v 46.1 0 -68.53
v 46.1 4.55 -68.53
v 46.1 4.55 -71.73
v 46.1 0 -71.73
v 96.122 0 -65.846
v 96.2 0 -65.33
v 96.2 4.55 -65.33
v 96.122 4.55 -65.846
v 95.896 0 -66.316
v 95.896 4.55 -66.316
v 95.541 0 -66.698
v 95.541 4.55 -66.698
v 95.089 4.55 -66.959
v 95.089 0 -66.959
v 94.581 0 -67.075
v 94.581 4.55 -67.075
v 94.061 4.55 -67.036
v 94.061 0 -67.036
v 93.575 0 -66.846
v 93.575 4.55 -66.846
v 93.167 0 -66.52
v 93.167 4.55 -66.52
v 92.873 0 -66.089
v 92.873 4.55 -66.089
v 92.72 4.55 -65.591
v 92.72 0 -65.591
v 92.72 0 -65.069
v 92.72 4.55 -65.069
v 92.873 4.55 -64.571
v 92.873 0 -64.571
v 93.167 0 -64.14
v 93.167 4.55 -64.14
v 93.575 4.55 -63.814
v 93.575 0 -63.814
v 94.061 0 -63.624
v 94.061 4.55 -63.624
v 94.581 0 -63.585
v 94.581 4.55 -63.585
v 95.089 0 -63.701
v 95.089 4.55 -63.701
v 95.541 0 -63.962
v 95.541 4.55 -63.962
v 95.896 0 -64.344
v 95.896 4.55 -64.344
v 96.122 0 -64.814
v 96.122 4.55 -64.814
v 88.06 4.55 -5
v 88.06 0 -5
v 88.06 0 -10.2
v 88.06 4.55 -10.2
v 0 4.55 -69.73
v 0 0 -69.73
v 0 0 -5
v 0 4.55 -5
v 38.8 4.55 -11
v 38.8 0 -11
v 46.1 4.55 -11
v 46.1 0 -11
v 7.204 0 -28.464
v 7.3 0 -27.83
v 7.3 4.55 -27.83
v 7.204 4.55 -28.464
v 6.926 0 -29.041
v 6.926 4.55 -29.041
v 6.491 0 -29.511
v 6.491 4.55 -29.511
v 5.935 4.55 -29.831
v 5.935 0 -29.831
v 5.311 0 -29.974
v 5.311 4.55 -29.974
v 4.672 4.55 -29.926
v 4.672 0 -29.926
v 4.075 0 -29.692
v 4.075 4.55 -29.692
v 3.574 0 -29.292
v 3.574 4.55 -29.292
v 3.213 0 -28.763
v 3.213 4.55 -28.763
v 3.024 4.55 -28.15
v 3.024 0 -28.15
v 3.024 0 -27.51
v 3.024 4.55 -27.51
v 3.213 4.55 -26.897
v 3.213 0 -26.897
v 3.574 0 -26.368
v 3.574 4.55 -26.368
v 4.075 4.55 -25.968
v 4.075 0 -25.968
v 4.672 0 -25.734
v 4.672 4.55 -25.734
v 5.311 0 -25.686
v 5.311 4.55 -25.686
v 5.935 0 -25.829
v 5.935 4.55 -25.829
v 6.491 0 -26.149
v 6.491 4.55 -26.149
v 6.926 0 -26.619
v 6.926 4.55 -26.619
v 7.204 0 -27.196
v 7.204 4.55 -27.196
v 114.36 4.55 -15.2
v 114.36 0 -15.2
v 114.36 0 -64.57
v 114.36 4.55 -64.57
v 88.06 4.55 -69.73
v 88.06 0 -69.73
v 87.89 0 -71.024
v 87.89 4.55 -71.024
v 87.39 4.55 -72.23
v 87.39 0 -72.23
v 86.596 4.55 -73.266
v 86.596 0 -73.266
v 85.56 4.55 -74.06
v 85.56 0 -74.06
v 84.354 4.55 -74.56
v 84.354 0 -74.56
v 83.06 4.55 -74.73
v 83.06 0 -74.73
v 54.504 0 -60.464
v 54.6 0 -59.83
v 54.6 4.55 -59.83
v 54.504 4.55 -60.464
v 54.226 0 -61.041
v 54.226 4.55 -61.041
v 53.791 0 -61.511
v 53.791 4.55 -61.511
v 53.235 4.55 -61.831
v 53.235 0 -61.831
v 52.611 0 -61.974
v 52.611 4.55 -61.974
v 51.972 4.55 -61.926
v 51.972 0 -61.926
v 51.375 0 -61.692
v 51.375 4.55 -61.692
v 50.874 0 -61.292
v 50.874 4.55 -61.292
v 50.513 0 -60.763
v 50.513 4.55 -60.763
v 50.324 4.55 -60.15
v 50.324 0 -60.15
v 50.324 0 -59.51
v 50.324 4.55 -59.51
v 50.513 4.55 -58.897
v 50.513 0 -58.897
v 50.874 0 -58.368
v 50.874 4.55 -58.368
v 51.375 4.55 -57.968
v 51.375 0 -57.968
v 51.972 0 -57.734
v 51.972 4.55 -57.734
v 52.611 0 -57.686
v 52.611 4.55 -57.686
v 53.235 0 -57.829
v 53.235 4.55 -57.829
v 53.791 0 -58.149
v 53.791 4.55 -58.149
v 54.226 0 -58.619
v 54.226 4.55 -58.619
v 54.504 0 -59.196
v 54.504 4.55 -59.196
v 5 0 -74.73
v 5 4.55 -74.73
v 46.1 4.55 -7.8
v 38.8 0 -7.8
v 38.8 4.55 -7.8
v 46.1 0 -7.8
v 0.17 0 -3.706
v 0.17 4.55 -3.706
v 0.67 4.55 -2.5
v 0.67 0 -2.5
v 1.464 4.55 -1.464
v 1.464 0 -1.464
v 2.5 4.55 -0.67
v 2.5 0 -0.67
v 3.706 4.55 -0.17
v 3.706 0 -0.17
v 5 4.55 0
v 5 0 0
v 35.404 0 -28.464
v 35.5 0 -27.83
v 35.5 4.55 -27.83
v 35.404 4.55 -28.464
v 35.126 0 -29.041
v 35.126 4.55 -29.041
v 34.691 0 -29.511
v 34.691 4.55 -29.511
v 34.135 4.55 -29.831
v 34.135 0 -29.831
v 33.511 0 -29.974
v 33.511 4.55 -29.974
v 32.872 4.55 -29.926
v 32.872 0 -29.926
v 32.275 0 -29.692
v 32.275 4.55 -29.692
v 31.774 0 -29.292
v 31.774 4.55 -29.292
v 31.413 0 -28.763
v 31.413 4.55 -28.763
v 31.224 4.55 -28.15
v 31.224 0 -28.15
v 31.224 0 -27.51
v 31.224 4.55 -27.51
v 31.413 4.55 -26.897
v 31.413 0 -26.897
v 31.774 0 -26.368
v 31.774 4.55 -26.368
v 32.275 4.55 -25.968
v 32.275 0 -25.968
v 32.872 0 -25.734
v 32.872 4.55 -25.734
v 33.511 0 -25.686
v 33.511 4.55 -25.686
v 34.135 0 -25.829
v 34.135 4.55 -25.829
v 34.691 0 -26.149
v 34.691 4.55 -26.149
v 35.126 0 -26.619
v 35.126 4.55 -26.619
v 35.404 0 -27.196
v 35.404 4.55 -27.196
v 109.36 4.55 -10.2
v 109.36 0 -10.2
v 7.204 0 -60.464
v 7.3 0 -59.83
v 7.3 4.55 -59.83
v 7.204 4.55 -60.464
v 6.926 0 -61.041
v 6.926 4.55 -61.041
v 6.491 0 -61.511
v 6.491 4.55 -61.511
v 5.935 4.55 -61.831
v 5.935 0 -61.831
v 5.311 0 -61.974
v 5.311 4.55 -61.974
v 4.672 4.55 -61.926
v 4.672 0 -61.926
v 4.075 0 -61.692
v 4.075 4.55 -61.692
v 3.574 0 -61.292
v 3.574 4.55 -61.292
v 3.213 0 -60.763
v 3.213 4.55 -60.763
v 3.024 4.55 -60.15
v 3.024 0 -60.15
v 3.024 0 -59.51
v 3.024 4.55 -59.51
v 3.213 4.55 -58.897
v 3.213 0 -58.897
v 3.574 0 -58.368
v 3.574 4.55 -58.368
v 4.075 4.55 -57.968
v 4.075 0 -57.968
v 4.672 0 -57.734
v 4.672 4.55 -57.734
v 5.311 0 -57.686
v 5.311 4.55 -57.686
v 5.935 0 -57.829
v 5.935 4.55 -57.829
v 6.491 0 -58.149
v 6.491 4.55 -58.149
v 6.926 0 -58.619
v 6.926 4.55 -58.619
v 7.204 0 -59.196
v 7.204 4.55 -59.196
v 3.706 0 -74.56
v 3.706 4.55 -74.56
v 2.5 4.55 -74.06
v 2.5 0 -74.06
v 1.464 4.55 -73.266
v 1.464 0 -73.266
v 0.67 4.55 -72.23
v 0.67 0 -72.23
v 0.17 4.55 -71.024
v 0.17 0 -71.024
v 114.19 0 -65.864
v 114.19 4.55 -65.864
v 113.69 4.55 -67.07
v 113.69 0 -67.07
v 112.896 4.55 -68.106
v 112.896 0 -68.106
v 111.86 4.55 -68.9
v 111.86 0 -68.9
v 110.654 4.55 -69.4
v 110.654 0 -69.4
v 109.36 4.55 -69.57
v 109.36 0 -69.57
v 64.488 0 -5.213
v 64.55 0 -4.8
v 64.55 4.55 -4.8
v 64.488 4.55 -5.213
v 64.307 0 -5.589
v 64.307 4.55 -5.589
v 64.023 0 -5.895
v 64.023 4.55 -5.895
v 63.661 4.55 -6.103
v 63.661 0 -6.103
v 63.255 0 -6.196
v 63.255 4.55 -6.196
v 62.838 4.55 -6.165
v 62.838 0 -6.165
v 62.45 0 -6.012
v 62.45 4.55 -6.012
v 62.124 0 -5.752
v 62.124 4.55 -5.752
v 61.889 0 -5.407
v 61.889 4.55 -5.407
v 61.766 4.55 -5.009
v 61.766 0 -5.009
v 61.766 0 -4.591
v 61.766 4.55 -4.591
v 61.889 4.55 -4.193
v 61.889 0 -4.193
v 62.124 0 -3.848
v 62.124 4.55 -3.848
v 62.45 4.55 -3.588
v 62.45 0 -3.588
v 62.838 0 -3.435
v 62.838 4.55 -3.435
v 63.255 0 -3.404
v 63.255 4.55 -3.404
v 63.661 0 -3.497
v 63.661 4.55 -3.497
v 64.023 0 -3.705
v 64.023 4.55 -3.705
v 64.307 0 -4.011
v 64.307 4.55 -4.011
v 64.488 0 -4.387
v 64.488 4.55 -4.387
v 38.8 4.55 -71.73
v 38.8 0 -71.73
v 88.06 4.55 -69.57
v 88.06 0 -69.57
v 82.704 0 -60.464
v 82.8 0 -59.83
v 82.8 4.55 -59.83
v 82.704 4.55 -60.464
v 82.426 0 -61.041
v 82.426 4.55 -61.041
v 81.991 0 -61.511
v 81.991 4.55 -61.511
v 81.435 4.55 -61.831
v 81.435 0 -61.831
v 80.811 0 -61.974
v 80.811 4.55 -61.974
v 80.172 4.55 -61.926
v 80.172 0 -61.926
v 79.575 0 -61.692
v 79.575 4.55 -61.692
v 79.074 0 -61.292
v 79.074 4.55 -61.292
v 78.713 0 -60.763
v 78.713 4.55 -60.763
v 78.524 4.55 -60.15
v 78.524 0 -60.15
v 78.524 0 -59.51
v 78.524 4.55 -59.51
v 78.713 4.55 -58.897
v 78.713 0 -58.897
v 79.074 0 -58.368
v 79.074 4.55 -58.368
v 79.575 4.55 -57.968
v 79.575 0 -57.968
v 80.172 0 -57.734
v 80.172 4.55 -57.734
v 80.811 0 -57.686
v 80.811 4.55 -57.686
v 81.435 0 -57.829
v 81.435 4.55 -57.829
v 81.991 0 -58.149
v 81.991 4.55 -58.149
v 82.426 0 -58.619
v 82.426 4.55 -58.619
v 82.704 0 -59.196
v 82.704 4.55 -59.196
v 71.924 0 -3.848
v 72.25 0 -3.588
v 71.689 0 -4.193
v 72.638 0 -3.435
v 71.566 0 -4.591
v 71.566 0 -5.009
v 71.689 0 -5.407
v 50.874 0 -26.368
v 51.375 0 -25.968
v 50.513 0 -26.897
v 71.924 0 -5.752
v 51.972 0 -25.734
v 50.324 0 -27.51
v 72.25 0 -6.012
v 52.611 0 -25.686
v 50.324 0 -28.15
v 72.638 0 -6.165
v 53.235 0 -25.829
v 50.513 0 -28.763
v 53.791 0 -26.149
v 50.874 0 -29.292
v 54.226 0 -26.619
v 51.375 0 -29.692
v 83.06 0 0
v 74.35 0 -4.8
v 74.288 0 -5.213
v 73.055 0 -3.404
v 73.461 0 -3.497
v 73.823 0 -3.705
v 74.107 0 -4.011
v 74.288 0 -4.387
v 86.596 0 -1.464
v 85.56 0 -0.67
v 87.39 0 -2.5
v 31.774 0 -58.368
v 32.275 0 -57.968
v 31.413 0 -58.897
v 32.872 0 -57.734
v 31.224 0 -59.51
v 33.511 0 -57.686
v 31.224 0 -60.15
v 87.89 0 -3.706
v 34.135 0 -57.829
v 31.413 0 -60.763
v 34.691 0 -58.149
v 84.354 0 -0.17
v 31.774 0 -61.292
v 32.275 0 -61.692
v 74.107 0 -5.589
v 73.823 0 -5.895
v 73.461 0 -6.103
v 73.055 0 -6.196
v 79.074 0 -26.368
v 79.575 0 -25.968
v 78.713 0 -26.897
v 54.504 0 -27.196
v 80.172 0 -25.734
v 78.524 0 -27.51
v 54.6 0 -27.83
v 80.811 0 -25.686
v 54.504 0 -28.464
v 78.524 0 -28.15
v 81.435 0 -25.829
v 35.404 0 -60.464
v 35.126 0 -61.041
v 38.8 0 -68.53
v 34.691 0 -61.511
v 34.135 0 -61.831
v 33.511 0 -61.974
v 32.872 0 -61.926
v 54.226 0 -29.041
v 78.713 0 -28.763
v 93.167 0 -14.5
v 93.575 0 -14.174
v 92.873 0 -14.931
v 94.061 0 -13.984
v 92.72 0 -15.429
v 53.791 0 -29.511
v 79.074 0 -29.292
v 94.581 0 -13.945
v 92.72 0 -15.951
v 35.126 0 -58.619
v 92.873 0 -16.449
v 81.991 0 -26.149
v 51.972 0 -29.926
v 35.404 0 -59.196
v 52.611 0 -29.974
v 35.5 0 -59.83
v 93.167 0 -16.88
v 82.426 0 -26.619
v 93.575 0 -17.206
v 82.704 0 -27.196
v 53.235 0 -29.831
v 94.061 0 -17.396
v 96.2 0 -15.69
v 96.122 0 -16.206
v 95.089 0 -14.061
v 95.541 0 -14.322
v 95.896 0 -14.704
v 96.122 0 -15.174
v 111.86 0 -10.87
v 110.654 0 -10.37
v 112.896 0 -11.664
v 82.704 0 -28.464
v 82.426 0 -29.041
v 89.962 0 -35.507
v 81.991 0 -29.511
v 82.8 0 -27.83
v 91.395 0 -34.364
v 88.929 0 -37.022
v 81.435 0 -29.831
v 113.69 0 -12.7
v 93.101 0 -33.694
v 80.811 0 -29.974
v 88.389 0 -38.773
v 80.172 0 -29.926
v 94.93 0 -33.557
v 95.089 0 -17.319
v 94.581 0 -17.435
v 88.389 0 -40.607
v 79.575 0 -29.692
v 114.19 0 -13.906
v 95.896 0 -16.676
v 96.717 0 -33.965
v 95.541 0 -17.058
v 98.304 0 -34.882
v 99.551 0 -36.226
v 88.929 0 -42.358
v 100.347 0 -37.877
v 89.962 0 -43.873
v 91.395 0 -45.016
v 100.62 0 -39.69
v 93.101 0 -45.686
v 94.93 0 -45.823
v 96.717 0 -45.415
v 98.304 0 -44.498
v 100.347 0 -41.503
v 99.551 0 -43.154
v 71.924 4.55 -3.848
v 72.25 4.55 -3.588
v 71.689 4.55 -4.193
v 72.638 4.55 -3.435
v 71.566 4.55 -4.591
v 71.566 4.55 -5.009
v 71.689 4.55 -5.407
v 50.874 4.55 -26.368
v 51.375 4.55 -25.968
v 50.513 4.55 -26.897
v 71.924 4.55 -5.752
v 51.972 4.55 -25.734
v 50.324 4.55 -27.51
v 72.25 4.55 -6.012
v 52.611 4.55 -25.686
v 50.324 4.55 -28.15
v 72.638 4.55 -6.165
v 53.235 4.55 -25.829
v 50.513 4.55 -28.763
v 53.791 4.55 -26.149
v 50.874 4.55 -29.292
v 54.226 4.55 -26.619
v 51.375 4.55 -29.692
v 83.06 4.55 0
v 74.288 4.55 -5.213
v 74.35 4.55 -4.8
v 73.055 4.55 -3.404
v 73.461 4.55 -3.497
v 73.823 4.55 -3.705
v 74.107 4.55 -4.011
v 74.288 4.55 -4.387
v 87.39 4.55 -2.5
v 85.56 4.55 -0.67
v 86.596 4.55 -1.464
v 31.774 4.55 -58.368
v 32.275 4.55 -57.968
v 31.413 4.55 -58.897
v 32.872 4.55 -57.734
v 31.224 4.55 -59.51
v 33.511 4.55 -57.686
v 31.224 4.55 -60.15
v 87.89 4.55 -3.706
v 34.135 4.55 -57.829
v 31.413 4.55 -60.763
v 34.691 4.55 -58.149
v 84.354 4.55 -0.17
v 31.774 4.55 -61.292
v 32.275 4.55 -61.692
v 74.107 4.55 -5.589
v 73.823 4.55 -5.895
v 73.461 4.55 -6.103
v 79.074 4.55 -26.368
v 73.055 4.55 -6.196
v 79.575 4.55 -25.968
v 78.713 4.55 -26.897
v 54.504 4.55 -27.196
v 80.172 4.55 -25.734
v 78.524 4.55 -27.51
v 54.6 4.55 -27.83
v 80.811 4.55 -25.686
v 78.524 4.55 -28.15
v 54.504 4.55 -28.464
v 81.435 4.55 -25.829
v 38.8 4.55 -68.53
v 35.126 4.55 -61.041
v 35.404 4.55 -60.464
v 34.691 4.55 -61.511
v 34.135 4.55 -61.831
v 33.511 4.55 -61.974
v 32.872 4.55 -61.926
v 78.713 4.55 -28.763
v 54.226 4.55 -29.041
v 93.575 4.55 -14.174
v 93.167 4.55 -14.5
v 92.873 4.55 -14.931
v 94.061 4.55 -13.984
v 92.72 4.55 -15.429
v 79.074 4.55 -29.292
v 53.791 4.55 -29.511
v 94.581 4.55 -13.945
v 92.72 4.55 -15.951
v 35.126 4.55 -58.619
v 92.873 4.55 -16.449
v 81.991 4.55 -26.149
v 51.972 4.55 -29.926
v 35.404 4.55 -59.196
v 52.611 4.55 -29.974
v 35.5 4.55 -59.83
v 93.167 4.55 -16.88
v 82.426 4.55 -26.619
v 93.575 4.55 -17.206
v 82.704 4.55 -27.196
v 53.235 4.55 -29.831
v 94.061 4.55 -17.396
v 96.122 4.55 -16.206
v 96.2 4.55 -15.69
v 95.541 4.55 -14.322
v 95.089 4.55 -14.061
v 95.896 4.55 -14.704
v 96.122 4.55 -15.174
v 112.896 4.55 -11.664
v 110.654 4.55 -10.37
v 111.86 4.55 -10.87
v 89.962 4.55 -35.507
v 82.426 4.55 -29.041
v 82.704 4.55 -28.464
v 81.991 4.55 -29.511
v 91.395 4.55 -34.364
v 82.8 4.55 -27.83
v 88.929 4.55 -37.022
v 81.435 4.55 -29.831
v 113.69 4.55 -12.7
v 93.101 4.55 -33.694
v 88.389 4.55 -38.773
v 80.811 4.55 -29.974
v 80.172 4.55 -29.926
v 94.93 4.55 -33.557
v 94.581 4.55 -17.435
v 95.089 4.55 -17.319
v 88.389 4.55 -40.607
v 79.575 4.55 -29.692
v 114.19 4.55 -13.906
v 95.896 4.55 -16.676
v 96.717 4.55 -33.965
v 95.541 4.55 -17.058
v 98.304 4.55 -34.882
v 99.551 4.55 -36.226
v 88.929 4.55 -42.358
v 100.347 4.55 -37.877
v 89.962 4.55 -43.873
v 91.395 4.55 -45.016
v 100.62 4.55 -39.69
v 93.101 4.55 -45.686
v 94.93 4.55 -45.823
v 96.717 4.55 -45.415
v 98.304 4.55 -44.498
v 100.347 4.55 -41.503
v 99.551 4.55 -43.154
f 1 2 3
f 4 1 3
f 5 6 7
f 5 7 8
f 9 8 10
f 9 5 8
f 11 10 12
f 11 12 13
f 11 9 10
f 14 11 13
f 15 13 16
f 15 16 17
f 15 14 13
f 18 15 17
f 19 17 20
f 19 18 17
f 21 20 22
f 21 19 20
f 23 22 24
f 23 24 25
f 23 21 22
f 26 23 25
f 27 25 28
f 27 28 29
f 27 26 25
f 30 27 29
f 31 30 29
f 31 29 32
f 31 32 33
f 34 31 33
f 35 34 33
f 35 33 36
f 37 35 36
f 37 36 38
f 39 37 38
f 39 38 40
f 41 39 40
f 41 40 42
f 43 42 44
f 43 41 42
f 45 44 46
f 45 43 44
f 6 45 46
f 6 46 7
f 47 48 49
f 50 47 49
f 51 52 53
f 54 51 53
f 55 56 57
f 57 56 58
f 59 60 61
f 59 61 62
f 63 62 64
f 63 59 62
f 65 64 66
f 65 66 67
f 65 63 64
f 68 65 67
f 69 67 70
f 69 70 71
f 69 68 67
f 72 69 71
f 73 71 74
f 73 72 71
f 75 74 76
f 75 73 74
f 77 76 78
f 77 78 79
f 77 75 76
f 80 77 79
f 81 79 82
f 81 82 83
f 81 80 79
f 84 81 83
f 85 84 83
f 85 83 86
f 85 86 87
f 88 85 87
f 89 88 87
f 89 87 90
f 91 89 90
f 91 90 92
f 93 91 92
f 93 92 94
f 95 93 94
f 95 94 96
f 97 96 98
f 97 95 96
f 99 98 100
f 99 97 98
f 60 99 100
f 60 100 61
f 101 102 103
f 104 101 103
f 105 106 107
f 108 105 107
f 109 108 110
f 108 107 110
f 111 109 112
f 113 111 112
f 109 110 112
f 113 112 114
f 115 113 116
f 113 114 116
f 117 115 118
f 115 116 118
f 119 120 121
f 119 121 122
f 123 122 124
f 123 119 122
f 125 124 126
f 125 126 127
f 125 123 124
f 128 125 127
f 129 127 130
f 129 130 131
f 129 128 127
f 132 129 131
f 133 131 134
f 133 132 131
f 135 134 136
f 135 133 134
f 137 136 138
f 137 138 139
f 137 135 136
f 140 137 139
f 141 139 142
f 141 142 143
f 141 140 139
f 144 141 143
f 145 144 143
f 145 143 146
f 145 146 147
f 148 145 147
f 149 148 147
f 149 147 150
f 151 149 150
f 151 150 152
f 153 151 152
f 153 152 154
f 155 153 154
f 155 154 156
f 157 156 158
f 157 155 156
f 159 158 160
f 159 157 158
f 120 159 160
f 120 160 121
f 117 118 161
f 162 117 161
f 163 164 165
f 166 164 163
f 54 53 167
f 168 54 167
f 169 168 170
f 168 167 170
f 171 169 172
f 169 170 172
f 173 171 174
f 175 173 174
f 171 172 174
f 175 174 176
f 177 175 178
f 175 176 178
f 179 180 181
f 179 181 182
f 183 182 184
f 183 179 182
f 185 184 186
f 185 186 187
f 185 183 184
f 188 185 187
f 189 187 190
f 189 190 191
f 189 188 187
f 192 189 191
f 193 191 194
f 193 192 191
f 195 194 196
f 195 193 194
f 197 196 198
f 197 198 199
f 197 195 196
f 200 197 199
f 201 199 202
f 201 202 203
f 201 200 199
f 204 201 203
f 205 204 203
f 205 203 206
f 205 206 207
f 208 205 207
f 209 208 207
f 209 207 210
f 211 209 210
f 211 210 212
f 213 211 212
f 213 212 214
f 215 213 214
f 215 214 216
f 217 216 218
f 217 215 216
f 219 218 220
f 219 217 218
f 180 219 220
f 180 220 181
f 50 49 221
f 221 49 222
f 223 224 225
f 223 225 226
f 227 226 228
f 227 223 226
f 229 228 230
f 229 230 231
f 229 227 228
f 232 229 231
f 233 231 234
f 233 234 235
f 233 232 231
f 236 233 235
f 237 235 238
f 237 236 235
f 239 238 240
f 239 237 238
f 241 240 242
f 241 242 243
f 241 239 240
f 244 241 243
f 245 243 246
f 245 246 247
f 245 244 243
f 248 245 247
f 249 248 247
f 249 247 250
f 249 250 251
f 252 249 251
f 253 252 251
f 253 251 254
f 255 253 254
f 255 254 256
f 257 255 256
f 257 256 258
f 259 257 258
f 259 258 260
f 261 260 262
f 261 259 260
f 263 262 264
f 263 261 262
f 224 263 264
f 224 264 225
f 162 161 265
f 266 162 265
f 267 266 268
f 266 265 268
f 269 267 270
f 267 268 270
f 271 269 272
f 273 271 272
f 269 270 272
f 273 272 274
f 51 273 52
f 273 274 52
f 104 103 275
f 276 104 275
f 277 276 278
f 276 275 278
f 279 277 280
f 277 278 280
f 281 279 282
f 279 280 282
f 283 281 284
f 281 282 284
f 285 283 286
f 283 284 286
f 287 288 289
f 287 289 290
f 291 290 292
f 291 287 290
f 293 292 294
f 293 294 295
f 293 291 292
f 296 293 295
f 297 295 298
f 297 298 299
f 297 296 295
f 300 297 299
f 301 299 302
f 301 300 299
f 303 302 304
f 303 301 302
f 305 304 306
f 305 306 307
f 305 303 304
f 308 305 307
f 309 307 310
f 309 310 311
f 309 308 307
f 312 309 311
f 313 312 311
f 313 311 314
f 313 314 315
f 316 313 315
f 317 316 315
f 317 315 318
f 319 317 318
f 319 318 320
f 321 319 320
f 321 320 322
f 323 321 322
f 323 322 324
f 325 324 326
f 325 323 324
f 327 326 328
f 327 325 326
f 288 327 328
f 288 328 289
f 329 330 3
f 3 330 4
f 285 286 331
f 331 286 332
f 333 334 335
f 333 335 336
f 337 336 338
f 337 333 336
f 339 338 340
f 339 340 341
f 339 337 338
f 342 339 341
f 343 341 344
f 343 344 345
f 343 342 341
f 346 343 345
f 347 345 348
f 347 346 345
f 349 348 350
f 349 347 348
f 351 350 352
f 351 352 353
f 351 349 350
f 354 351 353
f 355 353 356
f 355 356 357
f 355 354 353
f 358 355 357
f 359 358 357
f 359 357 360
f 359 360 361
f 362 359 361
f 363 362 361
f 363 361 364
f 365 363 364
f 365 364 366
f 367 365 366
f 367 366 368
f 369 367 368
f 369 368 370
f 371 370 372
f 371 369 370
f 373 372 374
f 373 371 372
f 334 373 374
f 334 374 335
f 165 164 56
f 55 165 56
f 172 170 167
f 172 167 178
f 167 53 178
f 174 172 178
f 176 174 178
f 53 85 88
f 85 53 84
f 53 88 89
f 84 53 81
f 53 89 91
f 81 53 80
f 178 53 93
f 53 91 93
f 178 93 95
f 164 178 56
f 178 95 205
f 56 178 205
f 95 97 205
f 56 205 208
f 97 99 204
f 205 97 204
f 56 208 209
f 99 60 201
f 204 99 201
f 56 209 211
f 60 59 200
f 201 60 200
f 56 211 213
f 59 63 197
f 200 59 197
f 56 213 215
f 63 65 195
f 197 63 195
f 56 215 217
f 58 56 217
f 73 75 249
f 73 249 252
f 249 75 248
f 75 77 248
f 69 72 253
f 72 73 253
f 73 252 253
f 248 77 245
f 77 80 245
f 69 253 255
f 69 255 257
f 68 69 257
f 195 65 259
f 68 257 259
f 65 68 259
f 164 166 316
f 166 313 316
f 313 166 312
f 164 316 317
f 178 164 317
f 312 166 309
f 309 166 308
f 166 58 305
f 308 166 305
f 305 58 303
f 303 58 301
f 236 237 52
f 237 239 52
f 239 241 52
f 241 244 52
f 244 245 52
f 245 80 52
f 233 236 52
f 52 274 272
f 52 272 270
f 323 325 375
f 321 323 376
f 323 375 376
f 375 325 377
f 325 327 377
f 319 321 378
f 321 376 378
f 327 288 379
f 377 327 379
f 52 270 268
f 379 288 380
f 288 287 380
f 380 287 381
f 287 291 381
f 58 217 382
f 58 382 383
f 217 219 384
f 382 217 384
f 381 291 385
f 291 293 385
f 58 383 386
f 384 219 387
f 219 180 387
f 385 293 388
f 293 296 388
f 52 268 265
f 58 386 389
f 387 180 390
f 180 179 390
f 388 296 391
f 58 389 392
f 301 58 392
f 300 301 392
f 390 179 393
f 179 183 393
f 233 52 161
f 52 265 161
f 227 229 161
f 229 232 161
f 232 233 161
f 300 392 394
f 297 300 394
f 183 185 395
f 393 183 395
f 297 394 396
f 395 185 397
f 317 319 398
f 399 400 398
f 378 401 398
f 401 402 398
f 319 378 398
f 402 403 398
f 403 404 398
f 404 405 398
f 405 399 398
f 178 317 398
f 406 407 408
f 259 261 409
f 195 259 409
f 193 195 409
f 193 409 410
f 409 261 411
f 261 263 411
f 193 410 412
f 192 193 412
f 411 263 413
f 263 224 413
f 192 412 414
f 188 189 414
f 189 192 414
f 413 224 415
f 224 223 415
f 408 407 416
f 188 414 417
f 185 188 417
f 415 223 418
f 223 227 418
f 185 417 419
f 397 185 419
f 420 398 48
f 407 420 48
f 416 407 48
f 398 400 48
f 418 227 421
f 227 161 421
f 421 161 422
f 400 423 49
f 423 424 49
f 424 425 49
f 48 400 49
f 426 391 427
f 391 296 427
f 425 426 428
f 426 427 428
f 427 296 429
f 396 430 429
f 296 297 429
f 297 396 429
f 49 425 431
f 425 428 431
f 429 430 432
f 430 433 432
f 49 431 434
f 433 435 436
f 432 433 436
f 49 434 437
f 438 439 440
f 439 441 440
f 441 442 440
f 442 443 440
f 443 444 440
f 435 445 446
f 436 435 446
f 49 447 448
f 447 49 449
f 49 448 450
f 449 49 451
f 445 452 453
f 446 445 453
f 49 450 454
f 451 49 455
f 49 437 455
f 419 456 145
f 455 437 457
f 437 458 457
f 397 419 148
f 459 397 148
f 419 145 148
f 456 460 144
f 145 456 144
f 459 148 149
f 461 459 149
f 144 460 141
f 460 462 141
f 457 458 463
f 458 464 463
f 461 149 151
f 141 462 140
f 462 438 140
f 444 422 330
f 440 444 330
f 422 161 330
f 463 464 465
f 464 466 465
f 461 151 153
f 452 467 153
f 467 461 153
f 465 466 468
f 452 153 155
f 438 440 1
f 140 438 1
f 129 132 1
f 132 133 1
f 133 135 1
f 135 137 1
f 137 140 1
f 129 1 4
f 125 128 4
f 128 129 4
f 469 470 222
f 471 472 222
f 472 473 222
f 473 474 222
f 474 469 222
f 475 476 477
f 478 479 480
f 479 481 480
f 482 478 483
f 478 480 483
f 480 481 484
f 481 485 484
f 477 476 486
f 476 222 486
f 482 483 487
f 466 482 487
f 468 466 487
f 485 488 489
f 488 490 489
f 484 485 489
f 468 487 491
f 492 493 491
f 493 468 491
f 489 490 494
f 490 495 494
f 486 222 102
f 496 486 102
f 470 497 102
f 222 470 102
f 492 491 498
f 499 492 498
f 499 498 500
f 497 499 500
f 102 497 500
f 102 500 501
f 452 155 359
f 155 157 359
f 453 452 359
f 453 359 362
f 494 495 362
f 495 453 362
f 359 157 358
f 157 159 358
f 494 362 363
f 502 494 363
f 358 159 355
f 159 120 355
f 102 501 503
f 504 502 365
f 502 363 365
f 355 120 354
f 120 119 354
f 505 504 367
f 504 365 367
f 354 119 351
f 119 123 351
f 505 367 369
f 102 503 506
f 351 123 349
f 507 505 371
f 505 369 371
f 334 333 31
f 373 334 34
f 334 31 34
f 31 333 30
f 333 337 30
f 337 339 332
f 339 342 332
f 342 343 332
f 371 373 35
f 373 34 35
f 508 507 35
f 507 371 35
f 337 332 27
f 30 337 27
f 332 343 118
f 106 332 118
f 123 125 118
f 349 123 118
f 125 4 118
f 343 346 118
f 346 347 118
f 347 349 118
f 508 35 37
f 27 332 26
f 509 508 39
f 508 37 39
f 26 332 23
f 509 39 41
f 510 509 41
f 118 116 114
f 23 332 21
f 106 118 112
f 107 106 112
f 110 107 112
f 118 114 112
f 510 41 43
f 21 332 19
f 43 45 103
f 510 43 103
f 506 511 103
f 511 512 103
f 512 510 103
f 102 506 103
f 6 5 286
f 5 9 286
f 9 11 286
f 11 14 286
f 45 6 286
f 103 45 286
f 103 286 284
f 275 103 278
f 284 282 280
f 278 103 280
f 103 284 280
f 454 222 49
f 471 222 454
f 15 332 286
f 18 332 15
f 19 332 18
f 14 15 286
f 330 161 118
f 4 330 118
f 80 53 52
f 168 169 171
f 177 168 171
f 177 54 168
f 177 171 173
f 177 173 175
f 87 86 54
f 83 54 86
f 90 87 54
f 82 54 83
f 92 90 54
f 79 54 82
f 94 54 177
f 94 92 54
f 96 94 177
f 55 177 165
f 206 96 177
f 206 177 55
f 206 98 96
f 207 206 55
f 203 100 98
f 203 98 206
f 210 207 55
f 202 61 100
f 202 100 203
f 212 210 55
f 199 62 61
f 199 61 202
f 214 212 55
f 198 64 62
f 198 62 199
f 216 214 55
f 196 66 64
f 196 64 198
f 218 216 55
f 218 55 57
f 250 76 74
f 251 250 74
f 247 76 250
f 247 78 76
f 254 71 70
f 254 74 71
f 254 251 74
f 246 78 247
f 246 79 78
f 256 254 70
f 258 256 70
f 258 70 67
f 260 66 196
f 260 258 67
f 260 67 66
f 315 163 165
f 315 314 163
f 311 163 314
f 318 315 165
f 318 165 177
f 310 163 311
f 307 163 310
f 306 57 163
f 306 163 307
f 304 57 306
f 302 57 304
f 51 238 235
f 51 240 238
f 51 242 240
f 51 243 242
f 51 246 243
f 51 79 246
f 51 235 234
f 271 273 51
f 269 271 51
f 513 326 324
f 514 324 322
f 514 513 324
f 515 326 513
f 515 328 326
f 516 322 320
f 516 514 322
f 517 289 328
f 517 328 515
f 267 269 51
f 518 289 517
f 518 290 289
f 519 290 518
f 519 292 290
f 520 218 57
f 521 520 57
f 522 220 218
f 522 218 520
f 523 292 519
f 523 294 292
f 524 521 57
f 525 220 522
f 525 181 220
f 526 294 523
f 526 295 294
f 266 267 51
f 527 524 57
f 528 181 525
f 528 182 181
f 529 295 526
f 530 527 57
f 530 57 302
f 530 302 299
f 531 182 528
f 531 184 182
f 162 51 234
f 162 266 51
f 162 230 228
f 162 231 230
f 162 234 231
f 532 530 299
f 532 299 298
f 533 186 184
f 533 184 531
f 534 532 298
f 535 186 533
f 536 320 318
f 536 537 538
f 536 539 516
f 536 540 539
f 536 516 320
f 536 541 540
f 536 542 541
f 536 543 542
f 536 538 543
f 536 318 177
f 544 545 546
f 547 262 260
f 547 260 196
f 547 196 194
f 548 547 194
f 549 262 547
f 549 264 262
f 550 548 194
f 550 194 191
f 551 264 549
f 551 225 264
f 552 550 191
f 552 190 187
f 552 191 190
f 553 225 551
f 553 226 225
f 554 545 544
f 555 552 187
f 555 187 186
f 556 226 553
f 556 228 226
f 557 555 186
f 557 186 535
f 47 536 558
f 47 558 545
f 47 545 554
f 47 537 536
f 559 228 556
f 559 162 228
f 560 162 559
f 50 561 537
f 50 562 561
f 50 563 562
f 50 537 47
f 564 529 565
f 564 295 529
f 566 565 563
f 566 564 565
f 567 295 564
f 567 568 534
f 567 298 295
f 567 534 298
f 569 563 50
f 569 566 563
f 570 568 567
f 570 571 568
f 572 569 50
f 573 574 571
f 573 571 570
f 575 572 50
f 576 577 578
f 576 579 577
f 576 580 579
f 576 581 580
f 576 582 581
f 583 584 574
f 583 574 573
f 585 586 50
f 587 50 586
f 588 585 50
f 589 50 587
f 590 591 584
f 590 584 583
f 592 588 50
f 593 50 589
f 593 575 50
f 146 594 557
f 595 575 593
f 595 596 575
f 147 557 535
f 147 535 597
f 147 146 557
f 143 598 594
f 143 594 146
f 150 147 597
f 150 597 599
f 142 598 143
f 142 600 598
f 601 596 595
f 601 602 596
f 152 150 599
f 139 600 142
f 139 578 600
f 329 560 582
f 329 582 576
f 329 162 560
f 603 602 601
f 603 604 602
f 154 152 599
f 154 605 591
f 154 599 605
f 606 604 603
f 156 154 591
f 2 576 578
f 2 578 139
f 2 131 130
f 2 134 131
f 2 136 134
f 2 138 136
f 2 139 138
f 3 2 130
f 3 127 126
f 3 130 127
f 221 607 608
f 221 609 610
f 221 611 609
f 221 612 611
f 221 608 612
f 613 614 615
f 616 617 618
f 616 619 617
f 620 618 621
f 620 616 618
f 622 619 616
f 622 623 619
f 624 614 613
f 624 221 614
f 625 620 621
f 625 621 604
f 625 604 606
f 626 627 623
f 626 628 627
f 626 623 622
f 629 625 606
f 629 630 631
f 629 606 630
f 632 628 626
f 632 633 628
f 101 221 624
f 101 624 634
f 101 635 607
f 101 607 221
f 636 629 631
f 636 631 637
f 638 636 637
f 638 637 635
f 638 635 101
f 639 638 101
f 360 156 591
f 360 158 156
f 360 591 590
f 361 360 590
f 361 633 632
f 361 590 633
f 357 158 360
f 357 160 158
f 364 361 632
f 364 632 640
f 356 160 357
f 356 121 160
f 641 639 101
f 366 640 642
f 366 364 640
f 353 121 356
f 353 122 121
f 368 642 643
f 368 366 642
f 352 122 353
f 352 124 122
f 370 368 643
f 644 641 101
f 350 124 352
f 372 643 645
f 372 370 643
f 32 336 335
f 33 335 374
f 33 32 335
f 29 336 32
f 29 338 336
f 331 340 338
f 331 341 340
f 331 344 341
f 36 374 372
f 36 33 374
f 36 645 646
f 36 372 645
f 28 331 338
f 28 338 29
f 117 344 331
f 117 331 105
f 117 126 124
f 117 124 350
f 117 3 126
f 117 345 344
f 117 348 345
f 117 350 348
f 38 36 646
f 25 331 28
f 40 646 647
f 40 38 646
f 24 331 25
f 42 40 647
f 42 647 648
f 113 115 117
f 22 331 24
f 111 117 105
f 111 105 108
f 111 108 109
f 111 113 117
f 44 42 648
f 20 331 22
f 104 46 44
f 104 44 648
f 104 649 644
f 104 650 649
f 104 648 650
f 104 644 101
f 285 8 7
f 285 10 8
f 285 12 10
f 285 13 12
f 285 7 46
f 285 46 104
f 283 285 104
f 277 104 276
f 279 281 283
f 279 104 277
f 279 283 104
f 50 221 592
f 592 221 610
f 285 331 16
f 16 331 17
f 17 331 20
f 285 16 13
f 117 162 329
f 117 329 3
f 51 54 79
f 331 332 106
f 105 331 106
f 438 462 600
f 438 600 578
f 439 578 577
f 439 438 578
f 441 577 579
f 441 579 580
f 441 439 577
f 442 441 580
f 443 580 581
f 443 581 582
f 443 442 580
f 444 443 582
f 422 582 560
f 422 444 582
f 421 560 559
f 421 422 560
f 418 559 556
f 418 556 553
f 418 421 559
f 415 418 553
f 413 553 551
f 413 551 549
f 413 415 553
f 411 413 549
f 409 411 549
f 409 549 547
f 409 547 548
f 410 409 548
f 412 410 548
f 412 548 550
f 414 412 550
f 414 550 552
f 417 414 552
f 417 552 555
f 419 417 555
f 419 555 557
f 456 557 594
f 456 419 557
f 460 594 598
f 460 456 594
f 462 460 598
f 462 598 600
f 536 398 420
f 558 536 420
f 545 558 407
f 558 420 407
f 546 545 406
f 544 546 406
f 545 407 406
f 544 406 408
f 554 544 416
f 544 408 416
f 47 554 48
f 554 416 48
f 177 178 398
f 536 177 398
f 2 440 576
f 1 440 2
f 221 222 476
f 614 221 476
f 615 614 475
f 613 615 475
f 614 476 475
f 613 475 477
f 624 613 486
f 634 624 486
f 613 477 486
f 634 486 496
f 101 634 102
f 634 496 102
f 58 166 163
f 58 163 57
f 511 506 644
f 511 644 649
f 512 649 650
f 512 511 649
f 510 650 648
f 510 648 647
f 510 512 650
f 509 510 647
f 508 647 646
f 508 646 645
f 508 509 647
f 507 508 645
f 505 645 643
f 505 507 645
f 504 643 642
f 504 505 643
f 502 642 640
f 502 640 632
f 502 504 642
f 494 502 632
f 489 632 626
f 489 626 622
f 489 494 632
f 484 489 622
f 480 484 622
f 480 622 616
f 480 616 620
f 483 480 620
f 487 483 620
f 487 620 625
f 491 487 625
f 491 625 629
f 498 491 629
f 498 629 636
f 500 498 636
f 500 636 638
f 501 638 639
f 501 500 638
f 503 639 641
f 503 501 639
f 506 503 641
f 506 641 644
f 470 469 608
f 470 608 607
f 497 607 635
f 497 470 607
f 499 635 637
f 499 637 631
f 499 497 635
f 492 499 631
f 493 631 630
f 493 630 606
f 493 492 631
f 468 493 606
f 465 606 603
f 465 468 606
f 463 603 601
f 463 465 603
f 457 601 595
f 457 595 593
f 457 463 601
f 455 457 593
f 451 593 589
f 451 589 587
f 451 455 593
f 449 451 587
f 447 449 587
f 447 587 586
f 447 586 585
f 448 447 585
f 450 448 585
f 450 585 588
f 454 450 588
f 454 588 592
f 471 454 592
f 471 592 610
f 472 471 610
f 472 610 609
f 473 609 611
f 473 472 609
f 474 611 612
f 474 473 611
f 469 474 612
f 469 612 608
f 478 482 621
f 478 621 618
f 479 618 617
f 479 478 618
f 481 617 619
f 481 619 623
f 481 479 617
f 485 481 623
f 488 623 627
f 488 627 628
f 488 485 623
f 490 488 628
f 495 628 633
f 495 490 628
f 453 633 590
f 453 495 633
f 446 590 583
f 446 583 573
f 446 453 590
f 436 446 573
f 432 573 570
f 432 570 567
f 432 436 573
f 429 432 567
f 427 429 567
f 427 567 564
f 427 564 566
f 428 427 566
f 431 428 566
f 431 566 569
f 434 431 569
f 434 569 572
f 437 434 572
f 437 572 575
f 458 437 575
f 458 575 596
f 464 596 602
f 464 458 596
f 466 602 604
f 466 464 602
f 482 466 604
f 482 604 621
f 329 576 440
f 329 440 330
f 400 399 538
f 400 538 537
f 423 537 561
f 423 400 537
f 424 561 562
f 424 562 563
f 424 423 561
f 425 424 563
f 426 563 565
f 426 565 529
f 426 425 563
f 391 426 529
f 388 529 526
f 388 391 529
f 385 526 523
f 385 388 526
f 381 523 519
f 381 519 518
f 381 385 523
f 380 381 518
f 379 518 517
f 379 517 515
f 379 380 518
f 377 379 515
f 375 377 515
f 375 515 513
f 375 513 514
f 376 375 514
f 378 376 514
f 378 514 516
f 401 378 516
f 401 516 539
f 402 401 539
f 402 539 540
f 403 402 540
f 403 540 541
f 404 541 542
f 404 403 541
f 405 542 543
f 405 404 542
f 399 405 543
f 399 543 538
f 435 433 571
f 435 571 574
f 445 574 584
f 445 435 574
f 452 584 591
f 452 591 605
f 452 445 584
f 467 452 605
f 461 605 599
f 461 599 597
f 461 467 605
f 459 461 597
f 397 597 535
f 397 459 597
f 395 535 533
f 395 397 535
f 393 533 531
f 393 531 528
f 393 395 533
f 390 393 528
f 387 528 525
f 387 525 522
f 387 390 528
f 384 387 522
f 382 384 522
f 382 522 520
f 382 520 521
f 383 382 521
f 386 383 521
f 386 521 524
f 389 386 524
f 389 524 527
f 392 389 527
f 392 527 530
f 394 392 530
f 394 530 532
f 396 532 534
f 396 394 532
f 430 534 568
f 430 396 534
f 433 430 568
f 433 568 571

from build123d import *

# Parameters (mm, degrees)
SKETCH1_R           = 2.15
SKETCH1_R_2         = 6.15
SKETCH1_R_3         = 1.75
SKETCH1_R_4         = 1.4
SKETCH1_W           = 7.3
SKETCH1_H           = 3.2
BOSS_EXTRUDE1_DEPTH = 4.55


with BuildPart() as part:
    # Sketch1 → Boss-Extrude1 (new body)
    with BuildSketch(Plane(origin=(0, 0, 0), x_dir=(1, 0, 0), z_dir=(0, 1, 0))):
        with BuildLine():
            Line((5, 0), (83.06, 0))
            ThreePointArc((83.06, 0), (86.595533906, 1.464466094), (88.06, 5))
            Line((88.06, 5), (88.06, 10.2))
            Line((88.06, 10.2), (109.36, 10.2))
            ThreePointArc((109.36, 10.2), (112.895533906, 11.664466094), (114.36, 15.2))
            Line((114.36, 15.2), (114.36, 64.57))
            ThreePointArc((114.36, 64.57), (112.895533906, 68.105533906), (109.36, 69.57))
            Line((109.36, 69.57), (88.06, 69.57))
            Line((88.06, 69.57), (88.06, 69.73))
            ThreePointArc((88.06, 69.73), (86.595533906, 73.265533906), (83.06, 74.73))
            Line((83.06, 74.73), (5, 74.73))
            ThreePointArc((5, 74.73), (1.464466094, 73.265533906), (0, 69.73))
            Line((0, 69.73), (0, 5))
            ThreePointArc((0, 5), (1.464466094, 1.464466094), (5, 0))
        make_face()
        with Locations((5.15, 59.83)):
            Circle(SKETCH1_R, mode=Mode.SUBTRACT)
        with Locations((33.35, 59.83)):
            Circle(SKETCH1_R, mode=Mode.SUBTRACT)
        with Locations((52.45, 59.83)):
            Circle(SKETCH1_R, mode=Mode.SUBTRACT)
        with Locations((80.65, 59.83)):
            Circle(SKETCH1_R, mode=Mode.SUBTRACT)
        with Locations((5.15, 27.83)):
            Circle(SKETCH1_R, mode=Mode.SUBTRACT)
        with Locations((33.35, 27.83)):
            Circle(SKETCH1_R, mode=Mode.SUBTRACT)
        with Locations((52.45, 27.83)):
            Circle(SKETCH1_R, mode=Mode.SUBTRACT)
        with Locations((80.65, 27.83)):
            Circle(SKETCH1_R, mode=Mode.SUBTRACT)
        with Locations((94.47, 39.69)):
            Circle(SKETCH1_R_2, mode=Mode.SUBTRACT)
        with Locations((94.45, 65.33)):
            Circle(SKETCH1_R_3, mode=Mode.SUBTRACT)
        with Locations((94.45, 15.69)):
            Circle(SKETCH1_R_3, mode=Mode.SUBTRACT)
        with Locations((63.15, 4.8)):
            Circle(SKETCH1_R_4, mode=Mode.SUBTRACT)
        with Locations((72.95, 4.8)):
            Circle(SKETCH1_R_4, mode=Mode.SUBTRACT)
        with Locations((42.45, 70.13)):
            Rectangle(SKETCH1_W, SKETCH1_H, mode=Mode.SUBTRACT)
        with Locations((42.45, 9.4)):
            Rectangle(SKETCH1_W, SKETCH1_H, mode=Mode.SUBTRACT)
    extrude(amount=BOSS_EXTRUDE1_DEPTH)


solid = part.part
